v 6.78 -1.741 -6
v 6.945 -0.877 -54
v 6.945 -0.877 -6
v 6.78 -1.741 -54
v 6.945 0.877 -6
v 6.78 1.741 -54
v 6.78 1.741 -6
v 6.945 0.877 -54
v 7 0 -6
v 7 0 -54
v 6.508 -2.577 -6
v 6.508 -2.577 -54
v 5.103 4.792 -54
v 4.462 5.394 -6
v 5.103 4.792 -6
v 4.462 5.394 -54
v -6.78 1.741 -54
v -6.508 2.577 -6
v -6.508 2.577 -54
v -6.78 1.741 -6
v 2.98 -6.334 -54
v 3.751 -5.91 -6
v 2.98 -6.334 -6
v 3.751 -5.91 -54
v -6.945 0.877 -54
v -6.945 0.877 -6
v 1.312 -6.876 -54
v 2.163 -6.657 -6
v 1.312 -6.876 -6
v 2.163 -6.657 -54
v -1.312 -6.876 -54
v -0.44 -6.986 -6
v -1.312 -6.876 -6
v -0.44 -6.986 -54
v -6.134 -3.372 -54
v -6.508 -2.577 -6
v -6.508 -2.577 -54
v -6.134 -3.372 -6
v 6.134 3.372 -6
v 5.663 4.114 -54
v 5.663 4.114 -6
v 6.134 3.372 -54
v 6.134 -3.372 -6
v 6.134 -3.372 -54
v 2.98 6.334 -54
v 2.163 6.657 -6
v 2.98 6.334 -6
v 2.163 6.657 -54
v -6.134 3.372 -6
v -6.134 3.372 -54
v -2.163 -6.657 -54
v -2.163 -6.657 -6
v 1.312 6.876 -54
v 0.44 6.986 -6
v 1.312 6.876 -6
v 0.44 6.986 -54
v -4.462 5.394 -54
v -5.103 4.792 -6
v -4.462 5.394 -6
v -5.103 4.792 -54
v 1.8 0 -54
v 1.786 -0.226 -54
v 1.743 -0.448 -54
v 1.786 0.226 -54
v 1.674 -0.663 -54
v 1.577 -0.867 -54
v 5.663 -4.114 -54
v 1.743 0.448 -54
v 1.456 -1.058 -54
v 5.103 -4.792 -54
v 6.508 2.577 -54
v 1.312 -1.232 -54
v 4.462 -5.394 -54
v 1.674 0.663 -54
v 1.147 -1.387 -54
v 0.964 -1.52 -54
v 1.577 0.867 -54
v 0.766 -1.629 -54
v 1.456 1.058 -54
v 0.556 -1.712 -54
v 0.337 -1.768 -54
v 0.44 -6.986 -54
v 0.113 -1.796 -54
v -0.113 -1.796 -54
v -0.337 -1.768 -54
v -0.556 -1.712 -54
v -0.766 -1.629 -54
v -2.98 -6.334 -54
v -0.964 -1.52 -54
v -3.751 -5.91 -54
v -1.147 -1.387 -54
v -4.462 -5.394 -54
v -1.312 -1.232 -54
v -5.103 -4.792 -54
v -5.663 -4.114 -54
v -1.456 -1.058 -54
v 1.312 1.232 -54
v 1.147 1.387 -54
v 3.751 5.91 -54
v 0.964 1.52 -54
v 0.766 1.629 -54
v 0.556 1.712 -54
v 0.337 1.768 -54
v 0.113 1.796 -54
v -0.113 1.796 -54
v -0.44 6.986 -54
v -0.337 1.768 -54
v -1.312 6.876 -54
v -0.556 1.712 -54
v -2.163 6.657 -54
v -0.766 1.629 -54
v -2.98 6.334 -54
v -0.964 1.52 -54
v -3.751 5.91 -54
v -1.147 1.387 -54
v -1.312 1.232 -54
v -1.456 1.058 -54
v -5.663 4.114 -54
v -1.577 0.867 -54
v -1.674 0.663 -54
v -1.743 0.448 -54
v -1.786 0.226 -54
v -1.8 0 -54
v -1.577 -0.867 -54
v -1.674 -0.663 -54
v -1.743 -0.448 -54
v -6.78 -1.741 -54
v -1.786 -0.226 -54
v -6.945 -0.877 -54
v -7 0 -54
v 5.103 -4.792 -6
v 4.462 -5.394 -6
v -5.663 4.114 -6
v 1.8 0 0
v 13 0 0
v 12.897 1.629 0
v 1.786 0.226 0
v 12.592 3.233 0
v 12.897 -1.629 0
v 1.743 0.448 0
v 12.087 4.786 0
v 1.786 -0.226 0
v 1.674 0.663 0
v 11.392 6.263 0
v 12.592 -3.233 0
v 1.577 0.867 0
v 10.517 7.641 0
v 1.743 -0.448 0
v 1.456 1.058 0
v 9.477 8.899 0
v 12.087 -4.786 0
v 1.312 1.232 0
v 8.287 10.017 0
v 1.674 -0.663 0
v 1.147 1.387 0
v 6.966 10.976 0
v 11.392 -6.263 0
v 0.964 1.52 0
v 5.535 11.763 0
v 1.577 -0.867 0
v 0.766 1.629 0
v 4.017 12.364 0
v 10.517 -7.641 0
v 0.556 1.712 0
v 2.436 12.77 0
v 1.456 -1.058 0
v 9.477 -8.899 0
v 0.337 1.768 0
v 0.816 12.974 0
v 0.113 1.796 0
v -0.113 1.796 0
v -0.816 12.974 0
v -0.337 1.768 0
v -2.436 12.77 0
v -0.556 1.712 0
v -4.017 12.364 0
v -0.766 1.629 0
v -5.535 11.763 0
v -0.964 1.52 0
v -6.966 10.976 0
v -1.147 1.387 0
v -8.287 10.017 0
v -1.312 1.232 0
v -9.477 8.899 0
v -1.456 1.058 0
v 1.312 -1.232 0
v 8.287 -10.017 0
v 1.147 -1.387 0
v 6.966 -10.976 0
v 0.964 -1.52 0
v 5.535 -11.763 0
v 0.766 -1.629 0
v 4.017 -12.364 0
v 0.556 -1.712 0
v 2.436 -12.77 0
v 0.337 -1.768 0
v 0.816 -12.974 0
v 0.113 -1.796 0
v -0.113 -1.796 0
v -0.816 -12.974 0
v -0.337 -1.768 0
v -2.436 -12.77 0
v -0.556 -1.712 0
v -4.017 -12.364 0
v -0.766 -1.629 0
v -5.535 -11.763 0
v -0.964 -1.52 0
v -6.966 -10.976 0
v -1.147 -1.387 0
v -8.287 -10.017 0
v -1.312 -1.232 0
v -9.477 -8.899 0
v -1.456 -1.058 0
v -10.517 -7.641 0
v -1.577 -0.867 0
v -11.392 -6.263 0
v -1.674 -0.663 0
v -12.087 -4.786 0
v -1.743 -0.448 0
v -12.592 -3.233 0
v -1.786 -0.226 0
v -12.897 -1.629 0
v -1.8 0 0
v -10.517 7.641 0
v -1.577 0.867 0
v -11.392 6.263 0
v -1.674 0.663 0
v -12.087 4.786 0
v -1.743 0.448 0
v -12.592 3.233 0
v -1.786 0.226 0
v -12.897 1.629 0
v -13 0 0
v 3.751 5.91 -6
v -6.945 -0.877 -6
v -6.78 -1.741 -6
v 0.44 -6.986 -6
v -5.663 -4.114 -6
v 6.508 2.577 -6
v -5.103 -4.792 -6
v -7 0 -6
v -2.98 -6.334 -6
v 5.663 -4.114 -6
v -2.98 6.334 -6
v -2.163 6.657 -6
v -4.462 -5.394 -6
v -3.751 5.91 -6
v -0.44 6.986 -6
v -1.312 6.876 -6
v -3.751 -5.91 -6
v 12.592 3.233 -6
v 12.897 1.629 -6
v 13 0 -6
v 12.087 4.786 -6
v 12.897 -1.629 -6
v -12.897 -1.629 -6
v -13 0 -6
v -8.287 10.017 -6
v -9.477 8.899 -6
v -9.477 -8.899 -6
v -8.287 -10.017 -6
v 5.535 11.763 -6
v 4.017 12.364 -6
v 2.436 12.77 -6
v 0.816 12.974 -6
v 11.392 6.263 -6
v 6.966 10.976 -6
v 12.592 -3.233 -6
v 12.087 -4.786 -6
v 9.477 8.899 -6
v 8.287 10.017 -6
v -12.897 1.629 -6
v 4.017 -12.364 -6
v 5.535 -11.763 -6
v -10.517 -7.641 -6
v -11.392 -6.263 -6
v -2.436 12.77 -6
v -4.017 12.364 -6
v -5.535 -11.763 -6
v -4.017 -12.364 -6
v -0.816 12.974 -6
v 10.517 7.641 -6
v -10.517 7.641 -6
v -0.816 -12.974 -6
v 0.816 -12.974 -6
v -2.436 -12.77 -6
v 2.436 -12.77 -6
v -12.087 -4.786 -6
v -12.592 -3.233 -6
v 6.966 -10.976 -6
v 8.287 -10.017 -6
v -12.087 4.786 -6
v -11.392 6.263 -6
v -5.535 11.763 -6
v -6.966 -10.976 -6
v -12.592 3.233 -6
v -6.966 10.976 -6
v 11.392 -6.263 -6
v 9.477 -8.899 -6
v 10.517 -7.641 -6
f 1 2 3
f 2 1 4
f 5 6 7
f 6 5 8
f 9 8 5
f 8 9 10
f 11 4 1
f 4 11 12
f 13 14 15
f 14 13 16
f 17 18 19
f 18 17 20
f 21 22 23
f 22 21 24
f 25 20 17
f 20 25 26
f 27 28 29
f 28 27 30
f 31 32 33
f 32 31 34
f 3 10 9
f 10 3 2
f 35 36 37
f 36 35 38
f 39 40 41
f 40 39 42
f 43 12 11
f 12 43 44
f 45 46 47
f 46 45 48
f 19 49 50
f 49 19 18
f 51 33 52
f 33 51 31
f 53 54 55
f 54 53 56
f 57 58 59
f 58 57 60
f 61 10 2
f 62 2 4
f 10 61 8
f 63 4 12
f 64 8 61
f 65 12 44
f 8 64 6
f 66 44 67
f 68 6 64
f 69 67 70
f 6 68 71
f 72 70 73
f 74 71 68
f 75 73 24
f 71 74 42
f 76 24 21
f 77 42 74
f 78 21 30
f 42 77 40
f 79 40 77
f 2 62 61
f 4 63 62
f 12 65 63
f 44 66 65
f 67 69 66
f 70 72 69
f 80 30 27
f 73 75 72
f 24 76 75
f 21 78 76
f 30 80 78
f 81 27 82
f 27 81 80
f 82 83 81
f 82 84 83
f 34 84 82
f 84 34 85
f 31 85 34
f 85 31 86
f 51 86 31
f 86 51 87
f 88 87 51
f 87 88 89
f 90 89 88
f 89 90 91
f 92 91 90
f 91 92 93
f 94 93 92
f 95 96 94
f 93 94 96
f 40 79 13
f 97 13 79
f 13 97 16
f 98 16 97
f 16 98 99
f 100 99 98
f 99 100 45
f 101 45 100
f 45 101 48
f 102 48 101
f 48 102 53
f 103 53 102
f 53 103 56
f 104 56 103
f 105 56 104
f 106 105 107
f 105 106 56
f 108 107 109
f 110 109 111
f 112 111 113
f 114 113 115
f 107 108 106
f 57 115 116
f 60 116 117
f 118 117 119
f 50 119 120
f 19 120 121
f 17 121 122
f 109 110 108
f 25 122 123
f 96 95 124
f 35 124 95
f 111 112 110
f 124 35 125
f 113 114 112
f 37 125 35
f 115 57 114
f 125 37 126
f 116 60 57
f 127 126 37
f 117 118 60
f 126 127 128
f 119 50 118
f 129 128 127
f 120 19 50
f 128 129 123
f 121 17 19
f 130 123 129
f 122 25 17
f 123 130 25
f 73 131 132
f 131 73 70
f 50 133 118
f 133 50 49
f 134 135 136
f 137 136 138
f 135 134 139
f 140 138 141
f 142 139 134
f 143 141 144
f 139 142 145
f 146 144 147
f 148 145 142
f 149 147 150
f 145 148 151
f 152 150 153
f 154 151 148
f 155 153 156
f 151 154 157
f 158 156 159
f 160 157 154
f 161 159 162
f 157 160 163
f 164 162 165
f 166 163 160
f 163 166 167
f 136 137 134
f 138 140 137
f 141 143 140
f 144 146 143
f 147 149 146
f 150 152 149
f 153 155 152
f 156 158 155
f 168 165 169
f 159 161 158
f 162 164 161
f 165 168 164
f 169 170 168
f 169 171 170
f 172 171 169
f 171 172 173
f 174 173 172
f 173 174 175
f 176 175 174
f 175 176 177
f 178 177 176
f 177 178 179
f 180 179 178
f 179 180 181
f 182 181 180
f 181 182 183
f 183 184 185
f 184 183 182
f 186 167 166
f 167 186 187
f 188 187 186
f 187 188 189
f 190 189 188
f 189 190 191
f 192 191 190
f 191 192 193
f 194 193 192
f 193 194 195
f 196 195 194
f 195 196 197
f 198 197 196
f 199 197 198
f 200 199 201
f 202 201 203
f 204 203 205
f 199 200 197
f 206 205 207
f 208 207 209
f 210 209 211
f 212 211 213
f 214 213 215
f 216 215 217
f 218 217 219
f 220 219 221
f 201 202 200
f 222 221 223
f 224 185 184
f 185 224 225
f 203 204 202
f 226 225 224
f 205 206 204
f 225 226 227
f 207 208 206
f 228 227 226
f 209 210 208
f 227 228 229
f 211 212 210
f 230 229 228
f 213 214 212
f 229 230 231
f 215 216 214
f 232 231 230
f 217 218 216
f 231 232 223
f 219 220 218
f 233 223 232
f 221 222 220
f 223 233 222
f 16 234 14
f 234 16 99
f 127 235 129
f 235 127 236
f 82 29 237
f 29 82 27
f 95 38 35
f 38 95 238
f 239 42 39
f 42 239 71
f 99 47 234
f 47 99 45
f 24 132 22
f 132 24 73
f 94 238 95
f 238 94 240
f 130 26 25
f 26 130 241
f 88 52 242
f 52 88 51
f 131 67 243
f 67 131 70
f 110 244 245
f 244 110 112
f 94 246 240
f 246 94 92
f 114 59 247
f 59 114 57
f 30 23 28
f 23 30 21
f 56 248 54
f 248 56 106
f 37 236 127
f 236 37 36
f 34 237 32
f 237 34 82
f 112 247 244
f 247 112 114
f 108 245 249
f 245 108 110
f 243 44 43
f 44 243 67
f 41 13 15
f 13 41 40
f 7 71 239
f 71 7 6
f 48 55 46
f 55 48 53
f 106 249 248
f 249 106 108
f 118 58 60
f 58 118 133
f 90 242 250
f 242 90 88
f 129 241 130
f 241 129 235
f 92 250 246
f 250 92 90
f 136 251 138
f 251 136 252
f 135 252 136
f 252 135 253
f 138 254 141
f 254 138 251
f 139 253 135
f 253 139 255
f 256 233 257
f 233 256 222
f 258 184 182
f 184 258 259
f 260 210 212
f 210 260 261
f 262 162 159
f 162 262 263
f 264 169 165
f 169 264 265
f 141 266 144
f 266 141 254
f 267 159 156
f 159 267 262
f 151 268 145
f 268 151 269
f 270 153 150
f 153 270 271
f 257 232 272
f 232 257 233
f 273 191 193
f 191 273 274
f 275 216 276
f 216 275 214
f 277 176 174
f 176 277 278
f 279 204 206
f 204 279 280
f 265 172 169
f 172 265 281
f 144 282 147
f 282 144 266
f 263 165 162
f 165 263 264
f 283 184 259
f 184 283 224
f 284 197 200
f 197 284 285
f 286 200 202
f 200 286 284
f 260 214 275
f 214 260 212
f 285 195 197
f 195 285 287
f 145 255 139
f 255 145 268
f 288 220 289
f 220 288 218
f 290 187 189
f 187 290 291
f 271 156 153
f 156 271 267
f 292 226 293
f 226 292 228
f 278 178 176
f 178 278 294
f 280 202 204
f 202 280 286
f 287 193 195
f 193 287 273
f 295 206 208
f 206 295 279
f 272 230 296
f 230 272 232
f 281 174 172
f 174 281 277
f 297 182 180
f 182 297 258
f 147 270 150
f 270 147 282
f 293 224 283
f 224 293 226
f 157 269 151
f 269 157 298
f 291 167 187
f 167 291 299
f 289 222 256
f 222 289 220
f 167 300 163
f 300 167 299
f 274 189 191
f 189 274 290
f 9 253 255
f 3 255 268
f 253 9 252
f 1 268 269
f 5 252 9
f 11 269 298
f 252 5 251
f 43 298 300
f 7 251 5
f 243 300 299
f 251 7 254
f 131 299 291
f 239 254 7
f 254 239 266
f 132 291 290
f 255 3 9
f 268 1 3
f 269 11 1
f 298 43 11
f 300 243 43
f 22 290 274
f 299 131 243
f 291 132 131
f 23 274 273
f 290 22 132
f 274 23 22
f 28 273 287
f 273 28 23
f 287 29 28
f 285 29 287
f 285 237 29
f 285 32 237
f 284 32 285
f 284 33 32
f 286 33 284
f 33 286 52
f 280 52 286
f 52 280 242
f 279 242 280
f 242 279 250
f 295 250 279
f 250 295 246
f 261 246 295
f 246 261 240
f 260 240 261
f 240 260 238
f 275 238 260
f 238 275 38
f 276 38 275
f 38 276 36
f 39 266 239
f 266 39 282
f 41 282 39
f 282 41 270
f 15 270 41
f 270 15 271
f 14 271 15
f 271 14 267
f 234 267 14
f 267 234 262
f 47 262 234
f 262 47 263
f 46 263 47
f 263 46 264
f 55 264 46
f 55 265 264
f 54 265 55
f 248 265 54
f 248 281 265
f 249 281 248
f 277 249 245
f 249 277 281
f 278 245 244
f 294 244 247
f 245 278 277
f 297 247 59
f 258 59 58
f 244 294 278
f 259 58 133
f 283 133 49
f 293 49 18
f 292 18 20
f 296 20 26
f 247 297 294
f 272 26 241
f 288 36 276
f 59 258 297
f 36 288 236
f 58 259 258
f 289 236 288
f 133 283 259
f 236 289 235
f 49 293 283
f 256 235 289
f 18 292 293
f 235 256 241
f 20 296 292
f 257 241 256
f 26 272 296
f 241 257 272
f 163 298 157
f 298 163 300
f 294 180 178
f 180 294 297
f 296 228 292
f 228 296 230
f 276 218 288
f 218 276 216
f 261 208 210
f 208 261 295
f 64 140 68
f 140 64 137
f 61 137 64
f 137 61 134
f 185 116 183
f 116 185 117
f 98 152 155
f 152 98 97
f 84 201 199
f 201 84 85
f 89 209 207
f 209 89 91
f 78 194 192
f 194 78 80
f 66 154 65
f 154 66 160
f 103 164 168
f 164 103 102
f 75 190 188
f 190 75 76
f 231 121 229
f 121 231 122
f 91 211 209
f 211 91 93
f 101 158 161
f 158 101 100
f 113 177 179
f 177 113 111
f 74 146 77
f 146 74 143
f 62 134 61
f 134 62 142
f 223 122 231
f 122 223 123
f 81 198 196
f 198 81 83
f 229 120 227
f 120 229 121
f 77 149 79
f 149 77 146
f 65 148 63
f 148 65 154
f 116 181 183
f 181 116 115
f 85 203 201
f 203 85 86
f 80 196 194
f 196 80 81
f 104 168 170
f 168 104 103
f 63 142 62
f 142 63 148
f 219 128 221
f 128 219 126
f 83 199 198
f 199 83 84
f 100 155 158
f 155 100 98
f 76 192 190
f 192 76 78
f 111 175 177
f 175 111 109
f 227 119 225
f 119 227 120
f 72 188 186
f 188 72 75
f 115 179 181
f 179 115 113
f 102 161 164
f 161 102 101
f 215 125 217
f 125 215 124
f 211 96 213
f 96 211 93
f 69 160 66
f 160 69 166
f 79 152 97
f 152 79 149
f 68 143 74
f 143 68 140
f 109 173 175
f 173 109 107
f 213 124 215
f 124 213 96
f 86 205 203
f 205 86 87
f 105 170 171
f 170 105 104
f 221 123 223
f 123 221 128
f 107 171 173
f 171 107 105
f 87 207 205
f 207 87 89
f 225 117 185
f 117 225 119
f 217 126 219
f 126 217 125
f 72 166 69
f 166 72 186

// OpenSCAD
$fn = 50;


difference() {
	union() {
		translate(v = [0, 0, -54.0000000000]) {
			cylinder(h = 54, r = 7.0000000000);
		}
		translate(v = [0, 0, -6.0000000000]) {
			cylinder(h = 6, r = 13.0000000000);
		}
	}
	union() {
		#translate(v = [0, 0, -54]) {
			cylinder(h = 54, r = 1.8000000000);
		}
	}
}
